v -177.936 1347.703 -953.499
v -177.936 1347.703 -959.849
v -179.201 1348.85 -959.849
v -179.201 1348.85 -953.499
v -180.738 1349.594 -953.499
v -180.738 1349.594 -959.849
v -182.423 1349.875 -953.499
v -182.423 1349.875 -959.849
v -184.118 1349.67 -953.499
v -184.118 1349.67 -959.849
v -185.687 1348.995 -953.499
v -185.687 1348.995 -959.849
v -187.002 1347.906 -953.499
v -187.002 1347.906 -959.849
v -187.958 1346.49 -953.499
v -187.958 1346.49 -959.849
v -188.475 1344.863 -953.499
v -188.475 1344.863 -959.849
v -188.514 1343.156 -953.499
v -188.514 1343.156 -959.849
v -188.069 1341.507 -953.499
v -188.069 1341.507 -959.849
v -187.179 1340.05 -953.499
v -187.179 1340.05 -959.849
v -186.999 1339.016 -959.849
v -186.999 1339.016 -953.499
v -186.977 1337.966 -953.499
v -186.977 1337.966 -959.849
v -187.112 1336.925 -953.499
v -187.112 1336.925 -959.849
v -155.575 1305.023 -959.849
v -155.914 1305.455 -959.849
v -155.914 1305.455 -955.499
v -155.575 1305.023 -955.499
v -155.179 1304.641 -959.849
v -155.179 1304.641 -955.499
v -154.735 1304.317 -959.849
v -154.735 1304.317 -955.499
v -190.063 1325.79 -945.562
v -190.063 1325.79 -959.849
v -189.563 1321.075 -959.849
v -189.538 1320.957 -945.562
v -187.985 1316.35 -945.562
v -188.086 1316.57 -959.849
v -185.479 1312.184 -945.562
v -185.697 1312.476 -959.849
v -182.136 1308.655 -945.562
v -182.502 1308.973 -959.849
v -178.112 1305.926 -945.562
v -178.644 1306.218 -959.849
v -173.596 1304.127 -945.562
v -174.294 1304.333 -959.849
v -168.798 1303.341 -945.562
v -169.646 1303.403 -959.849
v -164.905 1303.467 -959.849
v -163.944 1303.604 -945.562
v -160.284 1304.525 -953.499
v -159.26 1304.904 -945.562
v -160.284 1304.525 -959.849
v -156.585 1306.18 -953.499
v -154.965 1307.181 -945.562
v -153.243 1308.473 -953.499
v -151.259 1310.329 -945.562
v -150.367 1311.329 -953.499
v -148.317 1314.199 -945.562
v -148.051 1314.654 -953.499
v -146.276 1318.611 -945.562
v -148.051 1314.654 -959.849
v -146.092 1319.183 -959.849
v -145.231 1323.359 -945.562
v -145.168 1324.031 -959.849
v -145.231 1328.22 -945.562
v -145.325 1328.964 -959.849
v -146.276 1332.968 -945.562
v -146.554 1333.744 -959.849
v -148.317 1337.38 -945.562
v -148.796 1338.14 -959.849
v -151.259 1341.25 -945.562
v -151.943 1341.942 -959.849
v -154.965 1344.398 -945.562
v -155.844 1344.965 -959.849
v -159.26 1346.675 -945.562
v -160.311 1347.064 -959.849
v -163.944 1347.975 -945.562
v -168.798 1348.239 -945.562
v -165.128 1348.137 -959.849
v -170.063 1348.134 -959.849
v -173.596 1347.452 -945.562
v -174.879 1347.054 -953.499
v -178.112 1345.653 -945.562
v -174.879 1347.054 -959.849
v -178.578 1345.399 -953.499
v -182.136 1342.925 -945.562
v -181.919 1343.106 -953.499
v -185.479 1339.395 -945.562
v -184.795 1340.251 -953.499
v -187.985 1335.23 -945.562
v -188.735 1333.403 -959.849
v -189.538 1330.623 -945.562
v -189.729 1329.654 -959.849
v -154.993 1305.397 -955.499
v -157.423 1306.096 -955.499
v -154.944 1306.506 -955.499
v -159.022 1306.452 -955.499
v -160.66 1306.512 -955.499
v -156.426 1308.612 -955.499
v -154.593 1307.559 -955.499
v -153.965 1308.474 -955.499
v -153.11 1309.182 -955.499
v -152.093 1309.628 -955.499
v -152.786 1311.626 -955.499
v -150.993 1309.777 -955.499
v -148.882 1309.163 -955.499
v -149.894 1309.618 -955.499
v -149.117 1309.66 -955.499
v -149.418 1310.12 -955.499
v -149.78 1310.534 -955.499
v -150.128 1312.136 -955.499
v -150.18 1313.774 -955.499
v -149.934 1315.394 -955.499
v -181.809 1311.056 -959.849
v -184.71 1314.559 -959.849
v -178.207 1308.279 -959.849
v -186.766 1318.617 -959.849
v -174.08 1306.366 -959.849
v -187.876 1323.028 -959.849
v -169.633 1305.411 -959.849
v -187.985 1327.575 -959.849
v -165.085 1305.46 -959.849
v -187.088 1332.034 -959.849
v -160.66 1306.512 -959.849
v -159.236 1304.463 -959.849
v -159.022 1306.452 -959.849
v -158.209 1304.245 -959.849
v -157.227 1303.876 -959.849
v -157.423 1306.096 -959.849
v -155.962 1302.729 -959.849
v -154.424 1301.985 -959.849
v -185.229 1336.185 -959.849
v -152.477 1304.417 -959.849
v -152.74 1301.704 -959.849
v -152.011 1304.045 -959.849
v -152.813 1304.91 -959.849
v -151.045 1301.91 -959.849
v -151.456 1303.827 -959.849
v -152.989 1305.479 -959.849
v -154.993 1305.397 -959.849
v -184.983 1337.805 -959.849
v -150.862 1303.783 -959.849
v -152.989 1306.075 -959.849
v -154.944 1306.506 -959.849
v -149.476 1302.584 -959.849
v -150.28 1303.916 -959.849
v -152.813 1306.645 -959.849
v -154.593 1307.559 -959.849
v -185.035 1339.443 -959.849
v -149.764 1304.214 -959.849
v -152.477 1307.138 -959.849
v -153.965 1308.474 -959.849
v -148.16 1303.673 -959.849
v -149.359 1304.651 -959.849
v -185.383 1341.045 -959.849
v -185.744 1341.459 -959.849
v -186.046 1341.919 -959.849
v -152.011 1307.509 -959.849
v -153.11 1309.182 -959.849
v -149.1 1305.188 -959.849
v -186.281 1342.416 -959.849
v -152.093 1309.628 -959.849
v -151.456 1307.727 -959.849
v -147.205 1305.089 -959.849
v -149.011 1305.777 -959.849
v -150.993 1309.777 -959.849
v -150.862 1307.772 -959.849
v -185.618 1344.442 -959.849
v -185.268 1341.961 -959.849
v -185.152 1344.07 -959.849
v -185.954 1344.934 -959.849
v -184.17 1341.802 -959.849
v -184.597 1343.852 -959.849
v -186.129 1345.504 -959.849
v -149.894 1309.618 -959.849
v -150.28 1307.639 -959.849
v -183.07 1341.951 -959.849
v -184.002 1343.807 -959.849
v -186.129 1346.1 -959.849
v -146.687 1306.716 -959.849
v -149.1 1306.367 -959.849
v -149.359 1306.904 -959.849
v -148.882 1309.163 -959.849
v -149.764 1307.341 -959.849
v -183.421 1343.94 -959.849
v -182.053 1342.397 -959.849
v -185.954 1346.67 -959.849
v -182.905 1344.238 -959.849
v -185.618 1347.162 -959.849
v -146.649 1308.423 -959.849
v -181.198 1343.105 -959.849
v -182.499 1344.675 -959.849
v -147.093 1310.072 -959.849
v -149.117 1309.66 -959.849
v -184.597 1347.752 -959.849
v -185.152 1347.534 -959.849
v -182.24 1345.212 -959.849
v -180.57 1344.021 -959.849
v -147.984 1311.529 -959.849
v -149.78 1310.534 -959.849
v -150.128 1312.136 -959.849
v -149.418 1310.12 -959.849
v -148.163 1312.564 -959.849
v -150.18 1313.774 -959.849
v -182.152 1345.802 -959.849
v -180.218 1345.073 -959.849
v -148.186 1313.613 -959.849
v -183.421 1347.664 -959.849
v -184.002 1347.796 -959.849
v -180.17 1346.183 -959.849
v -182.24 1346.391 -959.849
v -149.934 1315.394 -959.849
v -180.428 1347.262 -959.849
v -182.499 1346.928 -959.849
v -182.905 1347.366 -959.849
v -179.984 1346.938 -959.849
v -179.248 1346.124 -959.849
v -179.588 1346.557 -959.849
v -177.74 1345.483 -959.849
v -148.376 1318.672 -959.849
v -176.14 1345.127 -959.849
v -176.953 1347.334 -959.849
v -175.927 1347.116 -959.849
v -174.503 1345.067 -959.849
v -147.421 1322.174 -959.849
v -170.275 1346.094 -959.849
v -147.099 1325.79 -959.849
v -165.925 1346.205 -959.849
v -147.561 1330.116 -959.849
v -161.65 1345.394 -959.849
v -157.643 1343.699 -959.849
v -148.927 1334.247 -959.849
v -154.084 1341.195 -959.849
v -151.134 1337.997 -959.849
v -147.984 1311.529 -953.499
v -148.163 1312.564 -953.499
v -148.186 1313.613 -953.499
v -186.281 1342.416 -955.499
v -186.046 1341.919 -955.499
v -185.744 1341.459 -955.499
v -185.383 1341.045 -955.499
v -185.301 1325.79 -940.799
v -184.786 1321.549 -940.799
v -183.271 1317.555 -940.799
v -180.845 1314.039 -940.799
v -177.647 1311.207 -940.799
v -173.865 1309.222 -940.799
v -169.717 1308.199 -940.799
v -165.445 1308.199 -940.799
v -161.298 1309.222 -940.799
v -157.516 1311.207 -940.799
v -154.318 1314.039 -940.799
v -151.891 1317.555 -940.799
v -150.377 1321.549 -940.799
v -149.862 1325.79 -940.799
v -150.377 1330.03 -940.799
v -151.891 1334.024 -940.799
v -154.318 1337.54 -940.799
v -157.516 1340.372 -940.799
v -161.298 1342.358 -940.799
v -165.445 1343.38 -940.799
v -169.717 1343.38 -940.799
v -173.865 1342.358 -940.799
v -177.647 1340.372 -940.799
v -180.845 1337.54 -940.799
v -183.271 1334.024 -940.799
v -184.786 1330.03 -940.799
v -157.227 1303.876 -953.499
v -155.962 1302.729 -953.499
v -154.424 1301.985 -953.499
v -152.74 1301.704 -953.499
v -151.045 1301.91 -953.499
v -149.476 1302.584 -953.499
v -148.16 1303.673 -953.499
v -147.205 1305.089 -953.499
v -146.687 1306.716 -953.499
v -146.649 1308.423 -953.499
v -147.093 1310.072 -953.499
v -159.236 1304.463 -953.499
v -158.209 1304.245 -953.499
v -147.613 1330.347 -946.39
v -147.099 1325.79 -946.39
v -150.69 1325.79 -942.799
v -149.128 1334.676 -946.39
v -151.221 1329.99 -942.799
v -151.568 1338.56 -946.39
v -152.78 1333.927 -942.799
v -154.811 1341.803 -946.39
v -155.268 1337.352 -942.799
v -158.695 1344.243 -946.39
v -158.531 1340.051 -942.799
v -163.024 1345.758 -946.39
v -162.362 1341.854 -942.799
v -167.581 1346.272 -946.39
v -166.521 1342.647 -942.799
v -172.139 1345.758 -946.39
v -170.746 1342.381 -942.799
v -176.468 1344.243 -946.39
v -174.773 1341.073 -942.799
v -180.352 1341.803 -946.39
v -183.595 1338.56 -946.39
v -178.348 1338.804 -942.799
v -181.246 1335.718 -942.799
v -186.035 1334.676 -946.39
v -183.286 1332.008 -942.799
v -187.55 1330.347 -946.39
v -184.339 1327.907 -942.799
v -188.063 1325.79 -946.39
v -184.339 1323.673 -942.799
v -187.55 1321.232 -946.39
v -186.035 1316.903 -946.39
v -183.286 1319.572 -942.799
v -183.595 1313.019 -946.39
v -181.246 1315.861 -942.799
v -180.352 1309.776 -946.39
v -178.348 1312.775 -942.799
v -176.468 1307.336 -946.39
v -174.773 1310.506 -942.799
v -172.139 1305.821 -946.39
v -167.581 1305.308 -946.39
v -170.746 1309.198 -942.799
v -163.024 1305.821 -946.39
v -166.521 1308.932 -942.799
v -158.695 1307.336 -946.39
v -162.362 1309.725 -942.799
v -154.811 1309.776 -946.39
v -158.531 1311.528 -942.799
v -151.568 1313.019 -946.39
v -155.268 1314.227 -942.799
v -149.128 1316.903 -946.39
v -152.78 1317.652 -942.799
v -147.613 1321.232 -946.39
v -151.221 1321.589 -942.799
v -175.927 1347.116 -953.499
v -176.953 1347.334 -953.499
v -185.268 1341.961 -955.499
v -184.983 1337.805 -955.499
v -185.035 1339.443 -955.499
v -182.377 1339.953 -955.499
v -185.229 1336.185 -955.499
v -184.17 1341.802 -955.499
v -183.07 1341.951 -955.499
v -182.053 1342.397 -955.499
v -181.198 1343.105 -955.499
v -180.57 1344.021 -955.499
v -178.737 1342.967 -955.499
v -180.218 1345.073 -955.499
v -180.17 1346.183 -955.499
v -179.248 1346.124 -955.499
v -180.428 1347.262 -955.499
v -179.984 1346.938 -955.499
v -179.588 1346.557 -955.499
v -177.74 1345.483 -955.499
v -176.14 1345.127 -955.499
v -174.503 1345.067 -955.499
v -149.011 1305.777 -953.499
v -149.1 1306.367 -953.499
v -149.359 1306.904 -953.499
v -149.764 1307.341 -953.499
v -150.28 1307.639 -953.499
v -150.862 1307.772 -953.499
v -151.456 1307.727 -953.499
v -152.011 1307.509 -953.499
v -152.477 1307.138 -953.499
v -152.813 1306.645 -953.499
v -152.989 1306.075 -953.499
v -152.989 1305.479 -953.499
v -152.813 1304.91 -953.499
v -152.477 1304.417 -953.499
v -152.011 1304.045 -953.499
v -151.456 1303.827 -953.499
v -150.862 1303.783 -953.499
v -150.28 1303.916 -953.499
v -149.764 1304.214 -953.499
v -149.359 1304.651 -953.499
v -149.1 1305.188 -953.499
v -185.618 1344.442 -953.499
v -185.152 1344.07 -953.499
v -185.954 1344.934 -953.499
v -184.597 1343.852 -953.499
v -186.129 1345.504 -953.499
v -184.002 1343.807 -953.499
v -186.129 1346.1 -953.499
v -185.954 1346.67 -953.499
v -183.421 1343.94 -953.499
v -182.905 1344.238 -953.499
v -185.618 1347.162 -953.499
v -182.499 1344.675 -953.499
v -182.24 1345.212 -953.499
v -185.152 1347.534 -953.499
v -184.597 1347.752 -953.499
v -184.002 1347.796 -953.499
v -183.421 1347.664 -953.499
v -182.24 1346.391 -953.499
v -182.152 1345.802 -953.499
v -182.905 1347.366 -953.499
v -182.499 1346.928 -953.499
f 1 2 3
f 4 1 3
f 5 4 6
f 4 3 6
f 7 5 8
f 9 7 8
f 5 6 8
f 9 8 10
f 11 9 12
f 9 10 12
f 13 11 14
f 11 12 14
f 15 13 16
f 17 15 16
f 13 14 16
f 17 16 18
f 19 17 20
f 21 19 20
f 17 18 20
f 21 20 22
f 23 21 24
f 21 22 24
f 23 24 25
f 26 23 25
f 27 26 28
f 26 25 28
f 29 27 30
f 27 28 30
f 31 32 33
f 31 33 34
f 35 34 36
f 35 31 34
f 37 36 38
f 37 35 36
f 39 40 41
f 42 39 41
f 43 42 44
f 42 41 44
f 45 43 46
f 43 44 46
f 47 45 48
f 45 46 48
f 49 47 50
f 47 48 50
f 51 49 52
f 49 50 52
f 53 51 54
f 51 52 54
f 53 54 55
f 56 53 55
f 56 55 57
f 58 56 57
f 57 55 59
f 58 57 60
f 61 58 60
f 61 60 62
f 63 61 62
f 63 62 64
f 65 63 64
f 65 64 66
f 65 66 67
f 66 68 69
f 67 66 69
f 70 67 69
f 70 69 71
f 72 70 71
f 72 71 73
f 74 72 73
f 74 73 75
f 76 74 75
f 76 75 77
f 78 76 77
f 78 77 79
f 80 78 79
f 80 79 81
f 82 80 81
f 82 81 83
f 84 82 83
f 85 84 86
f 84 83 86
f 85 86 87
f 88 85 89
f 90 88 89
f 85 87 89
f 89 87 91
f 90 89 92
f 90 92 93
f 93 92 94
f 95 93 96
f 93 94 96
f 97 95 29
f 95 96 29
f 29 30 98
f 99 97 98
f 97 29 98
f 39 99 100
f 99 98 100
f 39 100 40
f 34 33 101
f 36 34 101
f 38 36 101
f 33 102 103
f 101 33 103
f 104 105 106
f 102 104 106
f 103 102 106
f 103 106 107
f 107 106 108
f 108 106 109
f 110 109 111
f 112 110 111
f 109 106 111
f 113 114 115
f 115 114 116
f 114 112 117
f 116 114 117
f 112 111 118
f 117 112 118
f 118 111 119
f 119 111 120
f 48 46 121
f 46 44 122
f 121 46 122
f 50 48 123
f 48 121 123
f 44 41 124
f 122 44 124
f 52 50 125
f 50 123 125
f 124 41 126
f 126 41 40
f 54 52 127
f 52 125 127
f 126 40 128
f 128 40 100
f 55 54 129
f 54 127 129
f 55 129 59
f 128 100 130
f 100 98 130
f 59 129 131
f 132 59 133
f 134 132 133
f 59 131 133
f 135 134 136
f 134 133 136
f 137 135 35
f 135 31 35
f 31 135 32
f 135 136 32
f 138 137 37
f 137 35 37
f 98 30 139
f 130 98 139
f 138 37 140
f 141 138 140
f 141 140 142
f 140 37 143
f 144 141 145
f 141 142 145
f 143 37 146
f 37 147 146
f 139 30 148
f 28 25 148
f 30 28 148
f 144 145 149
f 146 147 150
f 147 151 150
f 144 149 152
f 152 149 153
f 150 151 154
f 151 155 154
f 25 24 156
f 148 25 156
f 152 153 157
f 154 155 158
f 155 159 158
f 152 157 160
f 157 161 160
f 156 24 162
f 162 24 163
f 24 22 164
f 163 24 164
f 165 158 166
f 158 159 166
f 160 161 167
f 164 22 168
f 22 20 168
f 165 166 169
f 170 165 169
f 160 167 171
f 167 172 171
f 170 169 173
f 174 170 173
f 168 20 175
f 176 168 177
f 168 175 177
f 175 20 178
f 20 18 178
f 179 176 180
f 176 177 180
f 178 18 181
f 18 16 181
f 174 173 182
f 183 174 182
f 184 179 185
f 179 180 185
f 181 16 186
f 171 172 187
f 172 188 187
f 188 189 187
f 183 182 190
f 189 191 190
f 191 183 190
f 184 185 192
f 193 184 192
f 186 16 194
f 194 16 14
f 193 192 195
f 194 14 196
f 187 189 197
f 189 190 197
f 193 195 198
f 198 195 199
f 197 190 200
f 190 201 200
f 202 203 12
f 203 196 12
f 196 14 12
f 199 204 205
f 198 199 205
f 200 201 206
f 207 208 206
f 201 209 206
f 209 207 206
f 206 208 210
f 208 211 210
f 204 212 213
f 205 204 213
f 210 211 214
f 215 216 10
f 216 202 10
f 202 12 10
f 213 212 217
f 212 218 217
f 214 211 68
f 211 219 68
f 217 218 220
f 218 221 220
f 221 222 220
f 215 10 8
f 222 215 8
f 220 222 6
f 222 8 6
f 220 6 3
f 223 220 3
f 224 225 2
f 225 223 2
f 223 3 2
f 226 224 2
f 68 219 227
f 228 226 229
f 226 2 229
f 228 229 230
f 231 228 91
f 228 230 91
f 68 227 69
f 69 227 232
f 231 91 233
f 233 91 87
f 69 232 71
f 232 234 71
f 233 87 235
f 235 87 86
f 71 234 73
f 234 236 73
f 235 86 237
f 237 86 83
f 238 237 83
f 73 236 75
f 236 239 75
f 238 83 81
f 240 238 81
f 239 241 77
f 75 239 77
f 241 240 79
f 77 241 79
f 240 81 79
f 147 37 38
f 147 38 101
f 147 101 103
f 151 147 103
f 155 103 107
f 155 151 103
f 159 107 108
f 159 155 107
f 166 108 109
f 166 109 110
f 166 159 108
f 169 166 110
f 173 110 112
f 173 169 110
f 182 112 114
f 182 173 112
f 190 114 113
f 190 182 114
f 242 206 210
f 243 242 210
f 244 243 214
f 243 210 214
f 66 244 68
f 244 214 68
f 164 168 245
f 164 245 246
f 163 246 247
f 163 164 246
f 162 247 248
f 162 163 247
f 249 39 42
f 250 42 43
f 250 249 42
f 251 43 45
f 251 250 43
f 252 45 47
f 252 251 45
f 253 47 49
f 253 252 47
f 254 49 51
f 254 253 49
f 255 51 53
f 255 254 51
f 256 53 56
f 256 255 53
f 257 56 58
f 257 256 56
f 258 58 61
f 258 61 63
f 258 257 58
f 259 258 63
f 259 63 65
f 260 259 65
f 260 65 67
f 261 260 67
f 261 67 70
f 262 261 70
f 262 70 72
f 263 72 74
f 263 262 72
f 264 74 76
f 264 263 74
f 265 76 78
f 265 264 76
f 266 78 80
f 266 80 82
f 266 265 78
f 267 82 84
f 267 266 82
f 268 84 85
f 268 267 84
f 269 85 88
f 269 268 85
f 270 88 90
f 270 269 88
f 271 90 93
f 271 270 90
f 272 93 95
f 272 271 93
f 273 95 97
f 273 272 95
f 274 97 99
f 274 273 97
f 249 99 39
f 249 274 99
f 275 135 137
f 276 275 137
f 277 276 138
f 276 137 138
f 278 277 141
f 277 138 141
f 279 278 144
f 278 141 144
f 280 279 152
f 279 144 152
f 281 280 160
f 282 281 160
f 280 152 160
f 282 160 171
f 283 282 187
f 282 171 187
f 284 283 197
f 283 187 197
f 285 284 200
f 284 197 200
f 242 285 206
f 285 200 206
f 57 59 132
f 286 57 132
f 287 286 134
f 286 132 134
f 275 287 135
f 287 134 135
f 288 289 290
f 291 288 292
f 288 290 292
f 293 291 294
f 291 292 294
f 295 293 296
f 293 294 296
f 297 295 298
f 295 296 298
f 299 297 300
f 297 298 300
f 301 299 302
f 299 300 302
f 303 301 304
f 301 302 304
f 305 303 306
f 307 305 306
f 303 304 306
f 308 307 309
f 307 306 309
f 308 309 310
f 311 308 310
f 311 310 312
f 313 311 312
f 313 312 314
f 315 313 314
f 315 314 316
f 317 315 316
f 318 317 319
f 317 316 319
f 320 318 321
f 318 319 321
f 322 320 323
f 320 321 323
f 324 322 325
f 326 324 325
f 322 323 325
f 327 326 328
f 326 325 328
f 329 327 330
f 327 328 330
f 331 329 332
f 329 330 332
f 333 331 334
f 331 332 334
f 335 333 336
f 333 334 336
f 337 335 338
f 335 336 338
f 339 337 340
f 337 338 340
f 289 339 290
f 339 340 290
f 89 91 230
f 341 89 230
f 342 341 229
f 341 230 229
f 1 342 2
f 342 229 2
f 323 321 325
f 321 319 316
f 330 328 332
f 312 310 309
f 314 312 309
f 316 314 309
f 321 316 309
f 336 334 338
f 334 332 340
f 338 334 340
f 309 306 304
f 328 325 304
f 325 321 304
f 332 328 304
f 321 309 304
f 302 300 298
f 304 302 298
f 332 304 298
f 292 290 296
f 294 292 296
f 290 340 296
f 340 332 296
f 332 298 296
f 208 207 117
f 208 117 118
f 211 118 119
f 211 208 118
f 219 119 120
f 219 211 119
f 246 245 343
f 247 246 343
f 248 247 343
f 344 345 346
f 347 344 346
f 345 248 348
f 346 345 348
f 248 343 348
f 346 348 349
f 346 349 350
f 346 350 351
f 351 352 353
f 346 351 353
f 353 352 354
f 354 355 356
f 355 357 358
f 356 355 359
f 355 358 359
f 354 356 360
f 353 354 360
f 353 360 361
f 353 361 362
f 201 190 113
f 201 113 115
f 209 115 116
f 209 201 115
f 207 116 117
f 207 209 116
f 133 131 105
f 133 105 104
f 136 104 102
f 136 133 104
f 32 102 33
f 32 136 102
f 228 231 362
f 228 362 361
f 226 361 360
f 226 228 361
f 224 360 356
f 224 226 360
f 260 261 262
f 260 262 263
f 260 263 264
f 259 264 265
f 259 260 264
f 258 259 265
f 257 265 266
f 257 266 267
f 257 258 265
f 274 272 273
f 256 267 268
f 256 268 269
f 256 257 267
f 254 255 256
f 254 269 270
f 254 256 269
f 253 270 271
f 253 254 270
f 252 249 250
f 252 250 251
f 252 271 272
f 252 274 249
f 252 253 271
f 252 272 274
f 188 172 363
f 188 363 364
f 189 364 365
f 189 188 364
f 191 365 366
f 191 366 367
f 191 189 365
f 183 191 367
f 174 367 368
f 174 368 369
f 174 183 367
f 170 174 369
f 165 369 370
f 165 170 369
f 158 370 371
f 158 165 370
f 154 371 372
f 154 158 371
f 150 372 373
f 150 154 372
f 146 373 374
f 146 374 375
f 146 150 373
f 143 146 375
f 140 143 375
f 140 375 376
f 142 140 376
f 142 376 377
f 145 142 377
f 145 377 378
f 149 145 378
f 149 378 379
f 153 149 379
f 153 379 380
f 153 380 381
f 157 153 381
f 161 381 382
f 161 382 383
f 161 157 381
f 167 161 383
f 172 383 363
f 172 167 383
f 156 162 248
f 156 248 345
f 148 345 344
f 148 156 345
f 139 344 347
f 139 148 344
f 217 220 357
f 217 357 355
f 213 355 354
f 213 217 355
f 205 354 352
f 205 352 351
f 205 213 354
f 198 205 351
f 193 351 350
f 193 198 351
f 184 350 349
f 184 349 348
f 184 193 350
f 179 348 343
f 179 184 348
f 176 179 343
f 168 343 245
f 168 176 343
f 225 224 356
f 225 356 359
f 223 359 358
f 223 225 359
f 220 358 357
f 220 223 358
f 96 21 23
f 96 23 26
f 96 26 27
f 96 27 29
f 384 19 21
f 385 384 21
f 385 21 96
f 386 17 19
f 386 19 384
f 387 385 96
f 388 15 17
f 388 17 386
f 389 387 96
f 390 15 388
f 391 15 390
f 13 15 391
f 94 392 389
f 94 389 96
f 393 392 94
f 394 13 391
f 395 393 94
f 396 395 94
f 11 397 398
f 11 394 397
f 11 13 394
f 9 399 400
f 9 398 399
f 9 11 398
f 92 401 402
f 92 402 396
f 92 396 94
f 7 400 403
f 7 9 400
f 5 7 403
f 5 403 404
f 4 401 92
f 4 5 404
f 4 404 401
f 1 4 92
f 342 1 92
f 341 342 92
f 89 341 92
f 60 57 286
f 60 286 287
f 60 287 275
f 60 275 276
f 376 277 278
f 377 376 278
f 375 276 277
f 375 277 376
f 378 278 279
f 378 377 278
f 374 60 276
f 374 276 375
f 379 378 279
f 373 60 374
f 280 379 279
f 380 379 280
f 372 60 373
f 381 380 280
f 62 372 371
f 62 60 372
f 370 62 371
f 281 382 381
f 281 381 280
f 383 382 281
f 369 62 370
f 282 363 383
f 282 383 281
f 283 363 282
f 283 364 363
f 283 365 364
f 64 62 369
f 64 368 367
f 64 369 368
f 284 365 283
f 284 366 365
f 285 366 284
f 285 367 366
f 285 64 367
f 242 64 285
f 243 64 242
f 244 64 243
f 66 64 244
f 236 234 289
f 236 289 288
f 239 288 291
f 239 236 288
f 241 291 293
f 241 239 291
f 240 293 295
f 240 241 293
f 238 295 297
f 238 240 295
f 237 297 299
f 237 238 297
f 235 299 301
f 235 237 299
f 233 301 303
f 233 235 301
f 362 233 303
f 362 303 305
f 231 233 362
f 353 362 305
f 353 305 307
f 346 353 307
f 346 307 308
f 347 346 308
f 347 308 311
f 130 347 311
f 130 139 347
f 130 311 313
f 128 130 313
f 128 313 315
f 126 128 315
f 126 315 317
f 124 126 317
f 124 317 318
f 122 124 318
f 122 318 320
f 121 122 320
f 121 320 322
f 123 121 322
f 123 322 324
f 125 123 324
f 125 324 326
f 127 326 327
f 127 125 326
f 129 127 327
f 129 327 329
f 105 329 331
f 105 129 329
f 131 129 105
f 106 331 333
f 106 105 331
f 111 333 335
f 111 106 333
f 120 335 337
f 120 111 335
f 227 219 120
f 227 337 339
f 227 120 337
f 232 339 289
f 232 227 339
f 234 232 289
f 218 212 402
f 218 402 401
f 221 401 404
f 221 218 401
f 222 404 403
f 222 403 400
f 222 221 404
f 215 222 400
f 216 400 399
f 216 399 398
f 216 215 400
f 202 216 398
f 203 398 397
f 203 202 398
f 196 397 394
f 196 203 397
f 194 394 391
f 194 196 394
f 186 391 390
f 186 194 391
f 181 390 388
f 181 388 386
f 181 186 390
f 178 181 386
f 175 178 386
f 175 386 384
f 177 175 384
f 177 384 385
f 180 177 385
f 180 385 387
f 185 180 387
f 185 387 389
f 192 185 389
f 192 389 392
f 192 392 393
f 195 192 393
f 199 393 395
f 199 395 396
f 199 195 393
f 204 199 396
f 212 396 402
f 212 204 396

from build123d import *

# Parameters (mm, degrees)
SKETCH1_R           = 22.482
SKETCH1_R_2         = 19.45
SKETCH1_R_3         = 5
SKETCH1_R_4         = 2.8
BOSS_EXTRUDE1_DEPTH = 19.05
SKETCH1_5_R         = 2
BOSS_EXTRUDE3_DEPTH = 6.35
CHAMFER1_SIZE       = 4.7625
SHELL1_START        = -959.849406281
SHELL1_OUTLINE_R    = 20.481999936
SHELL1_DEPTH        = 13.459072749
SHELL1_2_DEPTH      = 4.349999936


with BuildPart() as part:
    # Sketch1 → Boss-Extrude1 (new body)
    # profile 1 of 6: a face of its own
    with BuildSketch(Plane.XY.offset(-959.849406281)):
        with Locations(Location((-167.581326331, 1325.789589838, 0), (0, 0, 180))):
            Circle(SKETCH1_R)
        with Locations((-167.581326331, 1325.789589838)):
            Circle(SKETCH1_R_2, mode=Mode.SUBTRACT)
    # profile 2 of 6: a face of its own
    with BuildSketch(Plane.XY.offset(-959.849406281)):
        with Locations((-167.581326331, 1325.789589838)):
            Circle(SKETCH1_R_2)
        with Locations((-158.719406684, 1324.967166478)):
            Circle(SKETCH1_R_3, mode=Mode.SUBTRACT)
        with Locations((-176.443245977, 1326.612013197)):
            Circle(SKETCH1_R_3, mode=Mode.SUBTRACT)
        with Locations((-168.704072827, 1313.691575939)):
            Circle(SKETCH1_R_4, mode=Mode.SUBTRACT)
        Polygon((-169.416951474, 1318.076211503), (-167.966159705, 1333.709036048), (-165.745701187, 1333.502968172), (-167.196492956, 1317.870143628), align=None, mode=Mode.SUBTRACT)
    # profile 3 of 6: a face of its own
    with BuildSketch(Plane.XY.offset(-959.849406281)):
        with Locations((-168.704072827, 1313.691575939)):
            Circle(SKETCH1_R_4)
    # profile 4 of 6: a face of its own
    with BuildSketch(Plane.XY.offset(-959.849406281)):
        with Locations((-158.719406684, 1324.967166478)):
            Circle(SKETCH1_R_3)
    # profile 5 of 6: a face of its own
    with BuildSketch(Plane.XY.offset(-959.849406281)):
        Polygon((-167.966159705, 1333.709036048), (-165.745701187, 1333.502968172), (-167.196492956, 1317.870143628), (-169.416951474, 1318.076211503), align=None)
    # profile 6 of 6: a face of its own
    with BuildSketch(Plane.XY.offset(-959.849406281)):
        with Locations((-176.443245977, 1326.612013197)):
            Circle(SKETCH1_R_3)
    extrude(amount=BOSS_EXTRUDE1_DEPTH)

    # Sketch1<5> → Boss-Extrude3 (add)
    # profile 1 of 2: a face of its own
    with BuildSketch(Plane.XY.offset(-959.849406281)):
        with BuildLine():
            ThreePointArc((-187.111667422, 1336.925392497), (-181.91942666, 1343.106032976), (-174.878765823, 1347.054295358))
            ThreePointArc((-174.878765823, 1347.054295358), (-176.443944893, 1347.205674138), (-177.935770468, 1347.702823524))
            ThreePointArc((-177.935770468, 1347.702823524), (-186.383740435, 1348.497684162), (-187.178601073, 1340.049714195))
            ThreePointArc((-187.178601073, 1340.049714195), (-186.968441908, 1338.4913387), (-187.111667422, 1336.925392497))
        make_face()
        with Locations((-184.151583548, 1345.801858569)):
            Circle(SKETCH1_5_R, mode=Mode.SUBTRACT)
    # profile 2 of 2: a face of its own
    with BuildSketch(Plane.XY.offset(-959.849406281)):
        with BuildLine():
            ThreePointArc((-147.984051588, 1311.529465481), (-148.194210754, 1313.087840976), (-148.050985239, 1314.653787179))
            ThreePointArc((-148.050985239, 1314.653787179), (-153.243226001, 1308.4731467), (-160.283886838, 1304.524884318))
            ThreePointArc((-160.283886838, 1304.524884318), (-158.718707768, 1304.373505537), (-157.226882193, 1303.876356151))
            ThreePointArc((-157.226882193, 1303.876356151), (-148.778912226, 1303.081495514), (-147.984051588, 1311.529465481))
        make_face()
        with Locations((-151.011069114, 1305.777321107)):
            Circle(SKETCH1_5_R, mode=Mode.SUBTRACT)
    extrude(amount=BOSS_EXTRUDE3_DEPTH)

    # Chamfer1
    chamfer1_edges = [part.edges().sort_by_distance(p)[0] for p in [
        (-145.099326331, 1325.789589838, -940.799406281),
    ]]
    chamfer(chamfer1_edges, length=CHAMFER1_SIZE)

    # Shell1: read off the stored shape, not the designer's step
    # Shell1 outline → Shell1 (cut)
    with BuildSketch(Plane.XY.offset(SHELL1_START)):
        with Locations((-167.581326331, 1325.789589838)):
            Circle(SHELL1_OUTLINE_R)
    extrude(amount=SHELL1_DEPTH, mode=Mode.SUBTRACT)

    # Shell1 2 outline → Shell1 2 (cut)
    with BuildSketch(Plane.XY.offset(SHELL1_START)):
        with BuildLine():
            ThreePointArc((-179.248478566, 1346.124035779), (-179.779181822, 1346.754235772), (-180.427741548, 1347.262338379))
            ThreePointArc((-180.427741548, 1347.262338379), (-181.600547064, 1342.720914984), (-186.281027509, 1342.415788733))
            ThreePointArc((-186.281027509, 1342.415788733), (-185.902815813, 1341.683836624), (-185.382666181, 1341.044898178))
            ThreePointArc((-185.382666181, 1341.044898178), (-184.97132452, 1338.625607411), (-185.229107011, 1336.185173441))
            ThreePointArc((-185.229107011, 1336.185173441), (-180.643908398, 1341.565561159), (-174.502685337, 1345.066703493))
            ThreePointArc((-174.502685337, 1345.066703493), (-176.948372758, 1345.268651042), (-179.248478566, 1346.124035779))
        make_face()
        with BuildLine():
            ThreePointArc((-149.77998648, 1310.534281498), (-150.191328141, 1312.953572265), (-149.93354565, 1315.394006235))
            ThreePointArc((-149.93354565, 1315.394006235), (-154.518744264, 1310.013618517), (-160.659967324, 1306.512476183))
            ThreePointArc((-160.659967324, 1306.512476183), (-158.214279903, 1306.310528634), (-155.914174095, 1305.455143896))
            ThreePointArc((-155.914174095, 1305.455143896), (-155.383470839, 1304.824943903), (-154.734911113, 1304.316841296))
            ThreePointArc((-154.734911113, 1304.316841296), (-153.562105598, 1308.858264691), (-148.881625153, 1309.163390942))
            ThreePointArc((-148.881625153, 1309.163390942), (-149.259836848, 1309.895343052), (-149.77998648, 1310.534281498))
        make_face()
    extrude(amount=SHELL1_2_DEPTH, mode=Mode.SUBTRACT)

    # Shell1 3 outline → Shell1 3 (revolve, cut)
    with BuildSketch(Plane(origin=(-167.581326331, 1325.789589838, 0), x_dir=(1, 0, 0), z_dir=(0, -1, 0))):
        Polygon((16.891072849, -942.799406345), (0, -942.799406345), (0, -946.390333532), (20.481999936, -946.390333532), align=None)
    revolve(axis=Axis((-167.581326331, 1325.789589838, 0), (0, 0, 1)), mode=Mode.SUBTRACT)


solid = part.part
